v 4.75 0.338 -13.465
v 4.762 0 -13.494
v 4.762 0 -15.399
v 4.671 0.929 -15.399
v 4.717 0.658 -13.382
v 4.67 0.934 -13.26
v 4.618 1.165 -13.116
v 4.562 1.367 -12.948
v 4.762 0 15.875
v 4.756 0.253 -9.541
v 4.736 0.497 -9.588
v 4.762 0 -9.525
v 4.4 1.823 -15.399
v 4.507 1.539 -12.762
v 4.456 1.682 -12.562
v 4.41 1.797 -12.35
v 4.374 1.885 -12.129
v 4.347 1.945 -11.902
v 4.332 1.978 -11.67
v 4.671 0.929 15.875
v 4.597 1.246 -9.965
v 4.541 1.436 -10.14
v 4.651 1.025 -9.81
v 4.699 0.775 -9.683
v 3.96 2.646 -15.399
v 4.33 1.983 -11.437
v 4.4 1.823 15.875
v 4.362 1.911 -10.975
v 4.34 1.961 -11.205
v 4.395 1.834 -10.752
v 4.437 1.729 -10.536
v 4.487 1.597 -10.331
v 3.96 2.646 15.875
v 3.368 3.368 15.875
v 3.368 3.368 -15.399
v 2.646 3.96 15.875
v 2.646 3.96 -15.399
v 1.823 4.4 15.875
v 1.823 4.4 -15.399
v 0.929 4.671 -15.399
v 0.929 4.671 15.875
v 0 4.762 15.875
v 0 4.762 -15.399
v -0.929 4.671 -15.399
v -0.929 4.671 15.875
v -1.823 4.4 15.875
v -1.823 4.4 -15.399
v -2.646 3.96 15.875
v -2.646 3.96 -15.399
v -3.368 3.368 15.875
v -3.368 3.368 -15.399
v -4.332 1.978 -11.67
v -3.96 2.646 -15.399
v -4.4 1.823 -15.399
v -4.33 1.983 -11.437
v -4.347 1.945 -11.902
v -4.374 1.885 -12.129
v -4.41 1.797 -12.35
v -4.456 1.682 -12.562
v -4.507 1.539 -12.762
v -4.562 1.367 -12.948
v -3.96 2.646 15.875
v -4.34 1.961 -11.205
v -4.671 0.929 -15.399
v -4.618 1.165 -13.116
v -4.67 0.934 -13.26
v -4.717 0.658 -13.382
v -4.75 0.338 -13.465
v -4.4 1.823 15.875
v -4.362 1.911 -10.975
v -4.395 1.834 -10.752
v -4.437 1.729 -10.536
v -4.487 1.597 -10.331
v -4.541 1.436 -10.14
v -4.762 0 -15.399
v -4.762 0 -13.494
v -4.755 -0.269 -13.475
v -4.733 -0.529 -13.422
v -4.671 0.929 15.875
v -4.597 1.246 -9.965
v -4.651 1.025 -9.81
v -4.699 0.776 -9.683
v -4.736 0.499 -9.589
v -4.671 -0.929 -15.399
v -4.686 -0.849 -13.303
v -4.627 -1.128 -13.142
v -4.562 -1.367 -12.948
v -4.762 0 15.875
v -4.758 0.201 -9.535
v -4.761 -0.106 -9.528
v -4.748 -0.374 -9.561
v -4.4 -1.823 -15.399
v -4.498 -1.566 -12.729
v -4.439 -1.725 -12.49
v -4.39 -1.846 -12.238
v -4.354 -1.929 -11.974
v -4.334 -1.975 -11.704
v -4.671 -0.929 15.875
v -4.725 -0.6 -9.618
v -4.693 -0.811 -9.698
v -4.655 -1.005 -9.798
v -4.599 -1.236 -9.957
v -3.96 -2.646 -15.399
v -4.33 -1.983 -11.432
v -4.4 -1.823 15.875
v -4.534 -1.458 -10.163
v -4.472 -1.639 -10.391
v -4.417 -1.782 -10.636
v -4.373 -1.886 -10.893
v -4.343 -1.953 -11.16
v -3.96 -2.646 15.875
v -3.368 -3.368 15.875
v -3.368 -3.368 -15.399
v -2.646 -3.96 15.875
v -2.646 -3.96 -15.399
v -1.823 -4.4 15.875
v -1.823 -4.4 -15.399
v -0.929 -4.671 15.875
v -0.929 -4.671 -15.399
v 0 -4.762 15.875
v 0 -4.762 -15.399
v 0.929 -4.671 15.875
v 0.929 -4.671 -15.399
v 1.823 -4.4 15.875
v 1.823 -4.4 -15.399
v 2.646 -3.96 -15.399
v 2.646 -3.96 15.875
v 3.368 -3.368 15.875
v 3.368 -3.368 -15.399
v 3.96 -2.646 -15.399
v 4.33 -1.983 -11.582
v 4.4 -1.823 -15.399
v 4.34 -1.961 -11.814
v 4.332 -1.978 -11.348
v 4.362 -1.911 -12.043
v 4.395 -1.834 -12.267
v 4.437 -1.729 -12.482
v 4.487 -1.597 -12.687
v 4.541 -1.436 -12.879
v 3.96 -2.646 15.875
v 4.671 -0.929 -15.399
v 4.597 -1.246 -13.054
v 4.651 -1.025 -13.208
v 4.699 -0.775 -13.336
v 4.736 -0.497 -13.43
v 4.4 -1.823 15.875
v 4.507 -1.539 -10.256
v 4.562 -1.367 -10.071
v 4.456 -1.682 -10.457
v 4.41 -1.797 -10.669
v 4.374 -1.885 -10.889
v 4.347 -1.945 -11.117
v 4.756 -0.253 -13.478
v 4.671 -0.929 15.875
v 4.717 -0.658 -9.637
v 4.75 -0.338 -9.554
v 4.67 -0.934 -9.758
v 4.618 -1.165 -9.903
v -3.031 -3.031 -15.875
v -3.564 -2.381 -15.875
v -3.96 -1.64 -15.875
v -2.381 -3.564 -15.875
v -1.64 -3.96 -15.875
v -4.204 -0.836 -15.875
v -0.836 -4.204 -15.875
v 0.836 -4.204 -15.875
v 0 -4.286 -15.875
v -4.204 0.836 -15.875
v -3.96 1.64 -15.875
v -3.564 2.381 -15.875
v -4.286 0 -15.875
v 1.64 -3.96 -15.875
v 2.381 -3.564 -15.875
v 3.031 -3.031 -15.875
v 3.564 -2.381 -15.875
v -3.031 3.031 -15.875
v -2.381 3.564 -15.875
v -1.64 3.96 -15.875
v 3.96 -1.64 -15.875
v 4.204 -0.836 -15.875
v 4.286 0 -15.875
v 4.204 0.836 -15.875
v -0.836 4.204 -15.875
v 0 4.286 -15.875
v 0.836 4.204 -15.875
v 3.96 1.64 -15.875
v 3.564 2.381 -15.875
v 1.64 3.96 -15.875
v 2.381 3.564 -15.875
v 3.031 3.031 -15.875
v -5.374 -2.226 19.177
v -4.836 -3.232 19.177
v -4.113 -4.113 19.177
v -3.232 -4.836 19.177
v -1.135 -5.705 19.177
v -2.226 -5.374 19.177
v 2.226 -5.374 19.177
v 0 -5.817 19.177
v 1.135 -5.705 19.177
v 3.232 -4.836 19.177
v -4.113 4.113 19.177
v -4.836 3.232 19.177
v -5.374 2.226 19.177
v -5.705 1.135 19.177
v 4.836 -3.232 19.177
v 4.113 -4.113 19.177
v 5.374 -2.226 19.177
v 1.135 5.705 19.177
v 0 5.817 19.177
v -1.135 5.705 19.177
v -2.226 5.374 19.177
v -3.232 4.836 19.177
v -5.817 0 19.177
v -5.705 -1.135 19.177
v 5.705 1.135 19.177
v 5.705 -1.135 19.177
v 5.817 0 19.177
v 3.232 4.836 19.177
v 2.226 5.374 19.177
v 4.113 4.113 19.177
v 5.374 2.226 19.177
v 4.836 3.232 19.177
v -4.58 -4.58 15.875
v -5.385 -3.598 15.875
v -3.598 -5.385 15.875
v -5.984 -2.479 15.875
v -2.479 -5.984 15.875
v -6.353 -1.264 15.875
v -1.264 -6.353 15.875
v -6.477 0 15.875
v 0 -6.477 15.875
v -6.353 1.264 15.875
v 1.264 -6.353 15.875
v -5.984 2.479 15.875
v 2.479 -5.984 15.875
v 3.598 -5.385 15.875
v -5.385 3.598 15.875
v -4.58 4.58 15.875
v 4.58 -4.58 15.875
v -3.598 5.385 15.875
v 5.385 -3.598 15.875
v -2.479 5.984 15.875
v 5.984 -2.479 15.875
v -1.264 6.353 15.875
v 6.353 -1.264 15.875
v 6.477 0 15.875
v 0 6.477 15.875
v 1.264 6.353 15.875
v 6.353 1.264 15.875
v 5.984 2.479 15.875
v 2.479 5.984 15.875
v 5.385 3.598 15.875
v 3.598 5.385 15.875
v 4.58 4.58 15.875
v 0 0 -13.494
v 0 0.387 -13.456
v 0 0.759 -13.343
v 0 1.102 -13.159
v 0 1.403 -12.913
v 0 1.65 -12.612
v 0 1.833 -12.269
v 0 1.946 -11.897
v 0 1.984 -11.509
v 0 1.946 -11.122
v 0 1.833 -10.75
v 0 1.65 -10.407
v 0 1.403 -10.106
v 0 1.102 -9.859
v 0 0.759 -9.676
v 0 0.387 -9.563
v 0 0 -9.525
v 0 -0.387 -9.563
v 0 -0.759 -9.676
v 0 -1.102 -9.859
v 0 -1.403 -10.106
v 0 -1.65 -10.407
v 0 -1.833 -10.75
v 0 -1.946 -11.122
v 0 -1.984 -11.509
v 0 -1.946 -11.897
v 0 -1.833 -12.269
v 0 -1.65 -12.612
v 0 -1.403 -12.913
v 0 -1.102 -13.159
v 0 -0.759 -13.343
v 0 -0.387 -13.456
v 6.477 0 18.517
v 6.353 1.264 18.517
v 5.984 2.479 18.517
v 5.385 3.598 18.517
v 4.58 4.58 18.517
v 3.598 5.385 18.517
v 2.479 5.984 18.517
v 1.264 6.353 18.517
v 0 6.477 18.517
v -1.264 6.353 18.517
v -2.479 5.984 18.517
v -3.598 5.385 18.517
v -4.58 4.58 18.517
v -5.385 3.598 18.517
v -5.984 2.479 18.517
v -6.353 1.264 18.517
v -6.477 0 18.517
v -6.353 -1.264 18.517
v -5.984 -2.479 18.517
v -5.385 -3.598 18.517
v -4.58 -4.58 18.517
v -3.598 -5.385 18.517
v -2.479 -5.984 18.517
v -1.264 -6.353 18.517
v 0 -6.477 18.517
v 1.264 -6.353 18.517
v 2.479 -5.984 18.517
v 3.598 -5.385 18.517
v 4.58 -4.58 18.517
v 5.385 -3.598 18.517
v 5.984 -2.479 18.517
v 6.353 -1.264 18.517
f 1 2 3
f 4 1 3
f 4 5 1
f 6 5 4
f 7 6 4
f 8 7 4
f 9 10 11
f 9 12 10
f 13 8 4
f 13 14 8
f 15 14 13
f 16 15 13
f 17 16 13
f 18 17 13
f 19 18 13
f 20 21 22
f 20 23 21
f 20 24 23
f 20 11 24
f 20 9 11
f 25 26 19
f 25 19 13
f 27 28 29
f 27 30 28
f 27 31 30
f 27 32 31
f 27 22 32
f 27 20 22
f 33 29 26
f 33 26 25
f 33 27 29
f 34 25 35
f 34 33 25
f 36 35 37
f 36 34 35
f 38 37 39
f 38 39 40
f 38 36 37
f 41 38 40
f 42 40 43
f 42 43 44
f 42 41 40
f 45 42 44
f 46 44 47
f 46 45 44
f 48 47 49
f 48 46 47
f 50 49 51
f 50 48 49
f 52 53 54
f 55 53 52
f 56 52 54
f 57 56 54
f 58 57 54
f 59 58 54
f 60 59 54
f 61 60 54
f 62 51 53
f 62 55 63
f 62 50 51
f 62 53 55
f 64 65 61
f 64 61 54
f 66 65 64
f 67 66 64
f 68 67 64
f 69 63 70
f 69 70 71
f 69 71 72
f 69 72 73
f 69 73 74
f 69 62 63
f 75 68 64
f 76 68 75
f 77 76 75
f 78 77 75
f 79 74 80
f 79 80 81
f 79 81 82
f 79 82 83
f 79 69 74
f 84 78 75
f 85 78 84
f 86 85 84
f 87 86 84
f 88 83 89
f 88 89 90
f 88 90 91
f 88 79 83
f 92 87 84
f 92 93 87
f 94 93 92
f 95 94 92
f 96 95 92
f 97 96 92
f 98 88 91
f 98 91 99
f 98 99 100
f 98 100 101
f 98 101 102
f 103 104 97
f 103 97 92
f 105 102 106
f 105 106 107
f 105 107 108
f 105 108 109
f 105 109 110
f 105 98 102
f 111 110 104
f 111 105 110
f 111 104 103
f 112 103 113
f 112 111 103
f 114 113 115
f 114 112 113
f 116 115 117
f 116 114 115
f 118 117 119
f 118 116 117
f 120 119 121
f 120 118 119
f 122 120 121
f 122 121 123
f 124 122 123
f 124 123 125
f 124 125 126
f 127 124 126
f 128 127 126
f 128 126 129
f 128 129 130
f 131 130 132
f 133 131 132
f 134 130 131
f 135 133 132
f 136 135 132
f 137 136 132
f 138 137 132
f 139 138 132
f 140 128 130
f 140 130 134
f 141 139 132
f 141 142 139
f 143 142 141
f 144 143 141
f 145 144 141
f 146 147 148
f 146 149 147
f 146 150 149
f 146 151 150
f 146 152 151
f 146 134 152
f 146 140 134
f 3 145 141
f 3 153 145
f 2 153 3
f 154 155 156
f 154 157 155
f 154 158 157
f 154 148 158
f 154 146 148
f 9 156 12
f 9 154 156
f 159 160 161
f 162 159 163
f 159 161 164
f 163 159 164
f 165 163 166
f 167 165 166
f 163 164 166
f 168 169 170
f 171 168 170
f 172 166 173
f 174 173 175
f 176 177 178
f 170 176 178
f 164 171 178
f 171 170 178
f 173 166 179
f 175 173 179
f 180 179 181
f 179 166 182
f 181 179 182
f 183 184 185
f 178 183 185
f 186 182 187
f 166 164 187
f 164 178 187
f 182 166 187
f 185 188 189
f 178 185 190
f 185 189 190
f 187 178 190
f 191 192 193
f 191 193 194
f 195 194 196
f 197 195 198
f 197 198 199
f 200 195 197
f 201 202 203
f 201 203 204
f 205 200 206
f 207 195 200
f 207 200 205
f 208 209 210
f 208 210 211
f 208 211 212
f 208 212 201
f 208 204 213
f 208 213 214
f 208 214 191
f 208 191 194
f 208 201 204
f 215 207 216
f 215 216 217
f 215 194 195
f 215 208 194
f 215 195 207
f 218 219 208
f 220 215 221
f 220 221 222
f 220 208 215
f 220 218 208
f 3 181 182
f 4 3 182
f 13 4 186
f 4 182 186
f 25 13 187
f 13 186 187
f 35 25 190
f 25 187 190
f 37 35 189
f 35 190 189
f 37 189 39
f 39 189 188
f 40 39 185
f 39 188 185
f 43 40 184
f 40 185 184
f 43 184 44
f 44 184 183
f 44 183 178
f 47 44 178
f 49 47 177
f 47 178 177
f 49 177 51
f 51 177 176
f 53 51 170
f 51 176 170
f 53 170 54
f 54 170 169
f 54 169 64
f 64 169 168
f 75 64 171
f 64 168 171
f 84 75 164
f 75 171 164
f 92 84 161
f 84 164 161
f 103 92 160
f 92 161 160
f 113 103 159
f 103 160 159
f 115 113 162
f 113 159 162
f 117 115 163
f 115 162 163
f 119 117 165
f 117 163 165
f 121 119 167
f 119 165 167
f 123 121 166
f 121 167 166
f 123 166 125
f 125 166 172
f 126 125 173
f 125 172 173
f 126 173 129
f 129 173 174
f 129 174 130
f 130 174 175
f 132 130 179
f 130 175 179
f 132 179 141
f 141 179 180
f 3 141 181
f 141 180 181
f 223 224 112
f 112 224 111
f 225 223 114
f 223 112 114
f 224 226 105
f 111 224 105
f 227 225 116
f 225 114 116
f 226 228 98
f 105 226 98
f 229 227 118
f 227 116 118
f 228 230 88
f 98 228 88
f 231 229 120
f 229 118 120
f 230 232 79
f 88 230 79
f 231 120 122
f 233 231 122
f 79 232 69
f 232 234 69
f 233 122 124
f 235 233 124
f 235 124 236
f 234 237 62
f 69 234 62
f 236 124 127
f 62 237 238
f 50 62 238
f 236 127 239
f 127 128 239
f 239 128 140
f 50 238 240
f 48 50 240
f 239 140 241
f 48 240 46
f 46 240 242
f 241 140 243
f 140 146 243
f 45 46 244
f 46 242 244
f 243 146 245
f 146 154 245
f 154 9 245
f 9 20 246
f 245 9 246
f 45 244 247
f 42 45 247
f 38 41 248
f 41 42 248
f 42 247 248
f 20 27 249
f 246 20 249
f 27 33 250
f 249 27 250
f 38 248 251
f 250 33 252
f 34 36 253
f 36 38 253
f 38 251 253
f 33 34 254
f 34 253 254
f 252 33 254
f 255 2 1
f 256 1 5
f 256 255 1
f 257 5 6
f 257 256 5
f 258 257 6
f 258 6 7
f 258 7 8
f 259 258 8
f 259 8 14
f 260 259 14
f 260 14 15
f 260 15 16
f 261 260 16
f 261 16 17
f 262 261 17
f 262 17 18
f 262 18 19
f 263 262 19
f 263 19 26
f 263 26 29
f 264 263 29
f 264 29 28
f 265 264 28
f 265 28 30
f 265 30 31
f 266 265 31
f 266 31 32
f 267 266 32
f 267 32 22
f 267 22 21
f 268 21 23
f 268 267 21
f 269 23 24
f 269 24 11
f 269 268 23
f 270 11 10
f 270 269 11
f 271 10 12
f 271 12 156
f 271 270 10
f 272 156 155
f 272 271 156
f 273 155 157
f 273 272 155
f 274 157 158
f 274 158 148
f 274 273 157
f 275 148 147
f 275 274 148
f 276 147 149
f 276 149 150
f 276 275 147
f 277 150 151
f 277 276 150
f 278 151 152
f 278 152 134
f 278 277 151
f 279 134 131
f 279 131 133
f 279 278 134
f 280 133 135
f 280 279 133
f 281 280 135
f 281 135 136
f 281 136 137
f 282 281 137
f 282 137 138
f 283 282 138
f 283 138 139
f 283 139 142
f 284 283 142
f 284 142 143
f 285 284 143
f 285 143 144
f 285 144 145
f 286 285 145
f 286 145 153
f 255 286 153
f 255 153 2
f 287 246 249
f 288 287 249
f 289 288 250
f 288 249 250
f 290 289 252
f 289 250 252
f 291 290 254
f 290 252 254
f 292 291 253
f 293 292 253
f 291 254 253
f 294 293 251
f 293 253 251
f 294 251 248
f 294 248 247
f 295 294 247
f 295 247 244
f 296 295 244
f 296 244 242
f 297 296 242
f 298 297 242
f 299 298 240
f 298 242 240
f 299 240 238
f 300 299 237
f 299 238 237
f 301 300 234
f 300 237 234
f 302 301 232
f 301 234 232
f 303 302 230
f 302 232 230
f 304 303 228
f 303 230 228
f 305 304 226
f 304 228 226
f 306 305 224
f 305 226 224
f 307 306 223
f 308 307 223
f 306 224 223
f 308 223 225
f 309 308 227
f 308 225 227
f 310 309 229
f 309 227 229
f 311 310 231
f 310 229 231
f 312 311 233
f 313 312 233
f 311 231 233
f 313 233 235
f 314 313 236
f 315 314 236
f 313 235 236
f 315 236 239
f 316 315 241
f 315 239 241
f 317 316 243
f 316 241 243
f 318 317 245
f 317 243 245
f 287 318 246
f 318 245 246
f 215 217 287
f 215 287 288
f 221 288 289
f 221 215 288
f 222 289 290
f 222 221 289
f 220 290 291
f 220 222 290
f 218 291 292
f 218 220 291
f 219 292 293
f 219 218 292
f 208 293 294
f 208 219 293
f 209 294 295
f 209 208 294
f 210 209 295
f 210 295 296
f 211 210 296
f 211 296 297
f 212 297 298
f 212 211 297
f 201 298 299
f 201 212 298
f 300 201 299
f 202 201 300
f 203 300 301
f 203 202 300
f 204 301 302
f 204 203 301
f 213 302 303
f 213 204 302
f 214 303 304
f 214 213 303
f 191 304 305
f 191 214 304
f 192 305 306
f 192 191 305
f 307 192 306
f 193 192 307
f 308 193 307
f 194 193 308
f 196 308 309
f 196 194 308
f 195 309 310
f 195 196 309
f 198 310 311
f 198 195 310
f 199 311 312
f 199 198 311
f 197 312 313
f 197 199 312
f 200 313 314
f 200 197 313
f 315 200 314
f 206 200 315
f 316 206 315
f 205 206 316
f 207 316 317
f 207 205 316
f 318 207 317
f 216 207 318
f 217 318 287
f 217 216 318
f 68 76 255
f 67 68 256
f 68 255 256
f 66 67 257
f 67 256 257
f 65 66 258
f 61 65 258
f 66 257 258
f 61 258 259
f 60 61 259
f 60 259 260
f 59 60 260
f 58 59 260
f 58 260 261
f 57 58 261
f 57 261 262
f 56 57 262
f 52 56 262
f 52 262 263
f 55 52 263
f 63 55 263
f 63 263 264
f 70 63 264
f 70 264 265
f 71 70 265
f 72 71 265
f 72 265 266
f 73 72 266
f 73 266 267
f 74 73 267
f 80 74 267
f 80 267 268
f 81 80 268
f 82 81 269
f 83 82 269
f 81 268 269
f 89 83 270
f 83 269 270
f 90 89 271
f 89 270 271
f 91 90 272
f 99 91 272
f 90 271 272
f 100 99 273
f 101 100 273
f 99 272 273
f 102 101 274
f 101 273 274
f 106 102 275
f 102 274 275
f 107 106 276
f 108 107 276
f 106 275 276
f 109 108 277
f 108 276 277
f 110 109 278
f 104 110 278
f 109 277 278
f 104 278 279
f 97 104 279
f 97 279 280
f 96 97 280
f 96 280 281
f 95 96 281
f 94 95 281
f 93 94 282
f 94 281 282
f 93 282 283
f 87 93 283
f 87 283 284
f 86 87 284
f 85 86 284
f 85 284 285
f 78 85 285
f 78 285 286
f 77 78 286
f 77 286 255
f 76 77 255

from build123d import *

# Parameters (mm, degrees)
SKETCH1_R           = 4.7625
EXTRUDE1_DEPTH      = 15.875
SKETCH2_R           = 6.477
EXTRUDE2_DEPTH      = 3.302
CHAMFER1_SIZE       = 0.6604
SKETCH3_R           = 1.984375
EXTRUDE3_DEPTH      = 7.477
EXTRUDE3_DEPTH_BACK = 7.477
CHAMFER2_SIZE       = 0.47625


with BuildPart() as part:
    # Sketch1 → Extrude1 (new body, symmetric)
    with BuildSketch(Plane.XY):
        Circle(SKETCH1_R)
    extrude(amount=EXTRUDE1_DEPTH, both=True)

    # Sketch2 → Extrude2 (add)
    with BuildSketch(Plane.XY.offset(15.875)):
        Circle(SKETCH2_R)
    extrude(amount=EXTRUDE2_DEPTH)

    # Chamfer1
    chamfer1_edges = [part.edges().sort_by_distance(p)[0] for p in [
        (-6.477, 0, 19.177),
    ]]
    chamfer(chamfer1_edges, length=CHAMFER1_SIZE)

    # Sketch3 → Extrude3 (cut, two sides)
    with BuildSketch(Plane(origin=(0, 0, 0), x_dir=(0, 0, -1), z_dir=(1, 0, 0))) as extrude3_sk:
        with Locations((11.509375, 0)):
            Circle(SKETCH3_R)
    extrude(amount=EXTRUDE3_DEPTH, mode=Mode.SUBTRACT)
    extrude(extrude3_sk.sketch, amount=-EXTRUDE3_DEPTH_BACK, mode=Mode.SUBTRACT)

    # Chamfer2
    chamfer2_edges = [part.edges().sort_by_distance(p)[0] for p in [
        (-4.7625, 0, -15.875),
    ]]
    chamfer(chamfer2_edges, length=CHAMFER2_SIZE)


solid = part.part
